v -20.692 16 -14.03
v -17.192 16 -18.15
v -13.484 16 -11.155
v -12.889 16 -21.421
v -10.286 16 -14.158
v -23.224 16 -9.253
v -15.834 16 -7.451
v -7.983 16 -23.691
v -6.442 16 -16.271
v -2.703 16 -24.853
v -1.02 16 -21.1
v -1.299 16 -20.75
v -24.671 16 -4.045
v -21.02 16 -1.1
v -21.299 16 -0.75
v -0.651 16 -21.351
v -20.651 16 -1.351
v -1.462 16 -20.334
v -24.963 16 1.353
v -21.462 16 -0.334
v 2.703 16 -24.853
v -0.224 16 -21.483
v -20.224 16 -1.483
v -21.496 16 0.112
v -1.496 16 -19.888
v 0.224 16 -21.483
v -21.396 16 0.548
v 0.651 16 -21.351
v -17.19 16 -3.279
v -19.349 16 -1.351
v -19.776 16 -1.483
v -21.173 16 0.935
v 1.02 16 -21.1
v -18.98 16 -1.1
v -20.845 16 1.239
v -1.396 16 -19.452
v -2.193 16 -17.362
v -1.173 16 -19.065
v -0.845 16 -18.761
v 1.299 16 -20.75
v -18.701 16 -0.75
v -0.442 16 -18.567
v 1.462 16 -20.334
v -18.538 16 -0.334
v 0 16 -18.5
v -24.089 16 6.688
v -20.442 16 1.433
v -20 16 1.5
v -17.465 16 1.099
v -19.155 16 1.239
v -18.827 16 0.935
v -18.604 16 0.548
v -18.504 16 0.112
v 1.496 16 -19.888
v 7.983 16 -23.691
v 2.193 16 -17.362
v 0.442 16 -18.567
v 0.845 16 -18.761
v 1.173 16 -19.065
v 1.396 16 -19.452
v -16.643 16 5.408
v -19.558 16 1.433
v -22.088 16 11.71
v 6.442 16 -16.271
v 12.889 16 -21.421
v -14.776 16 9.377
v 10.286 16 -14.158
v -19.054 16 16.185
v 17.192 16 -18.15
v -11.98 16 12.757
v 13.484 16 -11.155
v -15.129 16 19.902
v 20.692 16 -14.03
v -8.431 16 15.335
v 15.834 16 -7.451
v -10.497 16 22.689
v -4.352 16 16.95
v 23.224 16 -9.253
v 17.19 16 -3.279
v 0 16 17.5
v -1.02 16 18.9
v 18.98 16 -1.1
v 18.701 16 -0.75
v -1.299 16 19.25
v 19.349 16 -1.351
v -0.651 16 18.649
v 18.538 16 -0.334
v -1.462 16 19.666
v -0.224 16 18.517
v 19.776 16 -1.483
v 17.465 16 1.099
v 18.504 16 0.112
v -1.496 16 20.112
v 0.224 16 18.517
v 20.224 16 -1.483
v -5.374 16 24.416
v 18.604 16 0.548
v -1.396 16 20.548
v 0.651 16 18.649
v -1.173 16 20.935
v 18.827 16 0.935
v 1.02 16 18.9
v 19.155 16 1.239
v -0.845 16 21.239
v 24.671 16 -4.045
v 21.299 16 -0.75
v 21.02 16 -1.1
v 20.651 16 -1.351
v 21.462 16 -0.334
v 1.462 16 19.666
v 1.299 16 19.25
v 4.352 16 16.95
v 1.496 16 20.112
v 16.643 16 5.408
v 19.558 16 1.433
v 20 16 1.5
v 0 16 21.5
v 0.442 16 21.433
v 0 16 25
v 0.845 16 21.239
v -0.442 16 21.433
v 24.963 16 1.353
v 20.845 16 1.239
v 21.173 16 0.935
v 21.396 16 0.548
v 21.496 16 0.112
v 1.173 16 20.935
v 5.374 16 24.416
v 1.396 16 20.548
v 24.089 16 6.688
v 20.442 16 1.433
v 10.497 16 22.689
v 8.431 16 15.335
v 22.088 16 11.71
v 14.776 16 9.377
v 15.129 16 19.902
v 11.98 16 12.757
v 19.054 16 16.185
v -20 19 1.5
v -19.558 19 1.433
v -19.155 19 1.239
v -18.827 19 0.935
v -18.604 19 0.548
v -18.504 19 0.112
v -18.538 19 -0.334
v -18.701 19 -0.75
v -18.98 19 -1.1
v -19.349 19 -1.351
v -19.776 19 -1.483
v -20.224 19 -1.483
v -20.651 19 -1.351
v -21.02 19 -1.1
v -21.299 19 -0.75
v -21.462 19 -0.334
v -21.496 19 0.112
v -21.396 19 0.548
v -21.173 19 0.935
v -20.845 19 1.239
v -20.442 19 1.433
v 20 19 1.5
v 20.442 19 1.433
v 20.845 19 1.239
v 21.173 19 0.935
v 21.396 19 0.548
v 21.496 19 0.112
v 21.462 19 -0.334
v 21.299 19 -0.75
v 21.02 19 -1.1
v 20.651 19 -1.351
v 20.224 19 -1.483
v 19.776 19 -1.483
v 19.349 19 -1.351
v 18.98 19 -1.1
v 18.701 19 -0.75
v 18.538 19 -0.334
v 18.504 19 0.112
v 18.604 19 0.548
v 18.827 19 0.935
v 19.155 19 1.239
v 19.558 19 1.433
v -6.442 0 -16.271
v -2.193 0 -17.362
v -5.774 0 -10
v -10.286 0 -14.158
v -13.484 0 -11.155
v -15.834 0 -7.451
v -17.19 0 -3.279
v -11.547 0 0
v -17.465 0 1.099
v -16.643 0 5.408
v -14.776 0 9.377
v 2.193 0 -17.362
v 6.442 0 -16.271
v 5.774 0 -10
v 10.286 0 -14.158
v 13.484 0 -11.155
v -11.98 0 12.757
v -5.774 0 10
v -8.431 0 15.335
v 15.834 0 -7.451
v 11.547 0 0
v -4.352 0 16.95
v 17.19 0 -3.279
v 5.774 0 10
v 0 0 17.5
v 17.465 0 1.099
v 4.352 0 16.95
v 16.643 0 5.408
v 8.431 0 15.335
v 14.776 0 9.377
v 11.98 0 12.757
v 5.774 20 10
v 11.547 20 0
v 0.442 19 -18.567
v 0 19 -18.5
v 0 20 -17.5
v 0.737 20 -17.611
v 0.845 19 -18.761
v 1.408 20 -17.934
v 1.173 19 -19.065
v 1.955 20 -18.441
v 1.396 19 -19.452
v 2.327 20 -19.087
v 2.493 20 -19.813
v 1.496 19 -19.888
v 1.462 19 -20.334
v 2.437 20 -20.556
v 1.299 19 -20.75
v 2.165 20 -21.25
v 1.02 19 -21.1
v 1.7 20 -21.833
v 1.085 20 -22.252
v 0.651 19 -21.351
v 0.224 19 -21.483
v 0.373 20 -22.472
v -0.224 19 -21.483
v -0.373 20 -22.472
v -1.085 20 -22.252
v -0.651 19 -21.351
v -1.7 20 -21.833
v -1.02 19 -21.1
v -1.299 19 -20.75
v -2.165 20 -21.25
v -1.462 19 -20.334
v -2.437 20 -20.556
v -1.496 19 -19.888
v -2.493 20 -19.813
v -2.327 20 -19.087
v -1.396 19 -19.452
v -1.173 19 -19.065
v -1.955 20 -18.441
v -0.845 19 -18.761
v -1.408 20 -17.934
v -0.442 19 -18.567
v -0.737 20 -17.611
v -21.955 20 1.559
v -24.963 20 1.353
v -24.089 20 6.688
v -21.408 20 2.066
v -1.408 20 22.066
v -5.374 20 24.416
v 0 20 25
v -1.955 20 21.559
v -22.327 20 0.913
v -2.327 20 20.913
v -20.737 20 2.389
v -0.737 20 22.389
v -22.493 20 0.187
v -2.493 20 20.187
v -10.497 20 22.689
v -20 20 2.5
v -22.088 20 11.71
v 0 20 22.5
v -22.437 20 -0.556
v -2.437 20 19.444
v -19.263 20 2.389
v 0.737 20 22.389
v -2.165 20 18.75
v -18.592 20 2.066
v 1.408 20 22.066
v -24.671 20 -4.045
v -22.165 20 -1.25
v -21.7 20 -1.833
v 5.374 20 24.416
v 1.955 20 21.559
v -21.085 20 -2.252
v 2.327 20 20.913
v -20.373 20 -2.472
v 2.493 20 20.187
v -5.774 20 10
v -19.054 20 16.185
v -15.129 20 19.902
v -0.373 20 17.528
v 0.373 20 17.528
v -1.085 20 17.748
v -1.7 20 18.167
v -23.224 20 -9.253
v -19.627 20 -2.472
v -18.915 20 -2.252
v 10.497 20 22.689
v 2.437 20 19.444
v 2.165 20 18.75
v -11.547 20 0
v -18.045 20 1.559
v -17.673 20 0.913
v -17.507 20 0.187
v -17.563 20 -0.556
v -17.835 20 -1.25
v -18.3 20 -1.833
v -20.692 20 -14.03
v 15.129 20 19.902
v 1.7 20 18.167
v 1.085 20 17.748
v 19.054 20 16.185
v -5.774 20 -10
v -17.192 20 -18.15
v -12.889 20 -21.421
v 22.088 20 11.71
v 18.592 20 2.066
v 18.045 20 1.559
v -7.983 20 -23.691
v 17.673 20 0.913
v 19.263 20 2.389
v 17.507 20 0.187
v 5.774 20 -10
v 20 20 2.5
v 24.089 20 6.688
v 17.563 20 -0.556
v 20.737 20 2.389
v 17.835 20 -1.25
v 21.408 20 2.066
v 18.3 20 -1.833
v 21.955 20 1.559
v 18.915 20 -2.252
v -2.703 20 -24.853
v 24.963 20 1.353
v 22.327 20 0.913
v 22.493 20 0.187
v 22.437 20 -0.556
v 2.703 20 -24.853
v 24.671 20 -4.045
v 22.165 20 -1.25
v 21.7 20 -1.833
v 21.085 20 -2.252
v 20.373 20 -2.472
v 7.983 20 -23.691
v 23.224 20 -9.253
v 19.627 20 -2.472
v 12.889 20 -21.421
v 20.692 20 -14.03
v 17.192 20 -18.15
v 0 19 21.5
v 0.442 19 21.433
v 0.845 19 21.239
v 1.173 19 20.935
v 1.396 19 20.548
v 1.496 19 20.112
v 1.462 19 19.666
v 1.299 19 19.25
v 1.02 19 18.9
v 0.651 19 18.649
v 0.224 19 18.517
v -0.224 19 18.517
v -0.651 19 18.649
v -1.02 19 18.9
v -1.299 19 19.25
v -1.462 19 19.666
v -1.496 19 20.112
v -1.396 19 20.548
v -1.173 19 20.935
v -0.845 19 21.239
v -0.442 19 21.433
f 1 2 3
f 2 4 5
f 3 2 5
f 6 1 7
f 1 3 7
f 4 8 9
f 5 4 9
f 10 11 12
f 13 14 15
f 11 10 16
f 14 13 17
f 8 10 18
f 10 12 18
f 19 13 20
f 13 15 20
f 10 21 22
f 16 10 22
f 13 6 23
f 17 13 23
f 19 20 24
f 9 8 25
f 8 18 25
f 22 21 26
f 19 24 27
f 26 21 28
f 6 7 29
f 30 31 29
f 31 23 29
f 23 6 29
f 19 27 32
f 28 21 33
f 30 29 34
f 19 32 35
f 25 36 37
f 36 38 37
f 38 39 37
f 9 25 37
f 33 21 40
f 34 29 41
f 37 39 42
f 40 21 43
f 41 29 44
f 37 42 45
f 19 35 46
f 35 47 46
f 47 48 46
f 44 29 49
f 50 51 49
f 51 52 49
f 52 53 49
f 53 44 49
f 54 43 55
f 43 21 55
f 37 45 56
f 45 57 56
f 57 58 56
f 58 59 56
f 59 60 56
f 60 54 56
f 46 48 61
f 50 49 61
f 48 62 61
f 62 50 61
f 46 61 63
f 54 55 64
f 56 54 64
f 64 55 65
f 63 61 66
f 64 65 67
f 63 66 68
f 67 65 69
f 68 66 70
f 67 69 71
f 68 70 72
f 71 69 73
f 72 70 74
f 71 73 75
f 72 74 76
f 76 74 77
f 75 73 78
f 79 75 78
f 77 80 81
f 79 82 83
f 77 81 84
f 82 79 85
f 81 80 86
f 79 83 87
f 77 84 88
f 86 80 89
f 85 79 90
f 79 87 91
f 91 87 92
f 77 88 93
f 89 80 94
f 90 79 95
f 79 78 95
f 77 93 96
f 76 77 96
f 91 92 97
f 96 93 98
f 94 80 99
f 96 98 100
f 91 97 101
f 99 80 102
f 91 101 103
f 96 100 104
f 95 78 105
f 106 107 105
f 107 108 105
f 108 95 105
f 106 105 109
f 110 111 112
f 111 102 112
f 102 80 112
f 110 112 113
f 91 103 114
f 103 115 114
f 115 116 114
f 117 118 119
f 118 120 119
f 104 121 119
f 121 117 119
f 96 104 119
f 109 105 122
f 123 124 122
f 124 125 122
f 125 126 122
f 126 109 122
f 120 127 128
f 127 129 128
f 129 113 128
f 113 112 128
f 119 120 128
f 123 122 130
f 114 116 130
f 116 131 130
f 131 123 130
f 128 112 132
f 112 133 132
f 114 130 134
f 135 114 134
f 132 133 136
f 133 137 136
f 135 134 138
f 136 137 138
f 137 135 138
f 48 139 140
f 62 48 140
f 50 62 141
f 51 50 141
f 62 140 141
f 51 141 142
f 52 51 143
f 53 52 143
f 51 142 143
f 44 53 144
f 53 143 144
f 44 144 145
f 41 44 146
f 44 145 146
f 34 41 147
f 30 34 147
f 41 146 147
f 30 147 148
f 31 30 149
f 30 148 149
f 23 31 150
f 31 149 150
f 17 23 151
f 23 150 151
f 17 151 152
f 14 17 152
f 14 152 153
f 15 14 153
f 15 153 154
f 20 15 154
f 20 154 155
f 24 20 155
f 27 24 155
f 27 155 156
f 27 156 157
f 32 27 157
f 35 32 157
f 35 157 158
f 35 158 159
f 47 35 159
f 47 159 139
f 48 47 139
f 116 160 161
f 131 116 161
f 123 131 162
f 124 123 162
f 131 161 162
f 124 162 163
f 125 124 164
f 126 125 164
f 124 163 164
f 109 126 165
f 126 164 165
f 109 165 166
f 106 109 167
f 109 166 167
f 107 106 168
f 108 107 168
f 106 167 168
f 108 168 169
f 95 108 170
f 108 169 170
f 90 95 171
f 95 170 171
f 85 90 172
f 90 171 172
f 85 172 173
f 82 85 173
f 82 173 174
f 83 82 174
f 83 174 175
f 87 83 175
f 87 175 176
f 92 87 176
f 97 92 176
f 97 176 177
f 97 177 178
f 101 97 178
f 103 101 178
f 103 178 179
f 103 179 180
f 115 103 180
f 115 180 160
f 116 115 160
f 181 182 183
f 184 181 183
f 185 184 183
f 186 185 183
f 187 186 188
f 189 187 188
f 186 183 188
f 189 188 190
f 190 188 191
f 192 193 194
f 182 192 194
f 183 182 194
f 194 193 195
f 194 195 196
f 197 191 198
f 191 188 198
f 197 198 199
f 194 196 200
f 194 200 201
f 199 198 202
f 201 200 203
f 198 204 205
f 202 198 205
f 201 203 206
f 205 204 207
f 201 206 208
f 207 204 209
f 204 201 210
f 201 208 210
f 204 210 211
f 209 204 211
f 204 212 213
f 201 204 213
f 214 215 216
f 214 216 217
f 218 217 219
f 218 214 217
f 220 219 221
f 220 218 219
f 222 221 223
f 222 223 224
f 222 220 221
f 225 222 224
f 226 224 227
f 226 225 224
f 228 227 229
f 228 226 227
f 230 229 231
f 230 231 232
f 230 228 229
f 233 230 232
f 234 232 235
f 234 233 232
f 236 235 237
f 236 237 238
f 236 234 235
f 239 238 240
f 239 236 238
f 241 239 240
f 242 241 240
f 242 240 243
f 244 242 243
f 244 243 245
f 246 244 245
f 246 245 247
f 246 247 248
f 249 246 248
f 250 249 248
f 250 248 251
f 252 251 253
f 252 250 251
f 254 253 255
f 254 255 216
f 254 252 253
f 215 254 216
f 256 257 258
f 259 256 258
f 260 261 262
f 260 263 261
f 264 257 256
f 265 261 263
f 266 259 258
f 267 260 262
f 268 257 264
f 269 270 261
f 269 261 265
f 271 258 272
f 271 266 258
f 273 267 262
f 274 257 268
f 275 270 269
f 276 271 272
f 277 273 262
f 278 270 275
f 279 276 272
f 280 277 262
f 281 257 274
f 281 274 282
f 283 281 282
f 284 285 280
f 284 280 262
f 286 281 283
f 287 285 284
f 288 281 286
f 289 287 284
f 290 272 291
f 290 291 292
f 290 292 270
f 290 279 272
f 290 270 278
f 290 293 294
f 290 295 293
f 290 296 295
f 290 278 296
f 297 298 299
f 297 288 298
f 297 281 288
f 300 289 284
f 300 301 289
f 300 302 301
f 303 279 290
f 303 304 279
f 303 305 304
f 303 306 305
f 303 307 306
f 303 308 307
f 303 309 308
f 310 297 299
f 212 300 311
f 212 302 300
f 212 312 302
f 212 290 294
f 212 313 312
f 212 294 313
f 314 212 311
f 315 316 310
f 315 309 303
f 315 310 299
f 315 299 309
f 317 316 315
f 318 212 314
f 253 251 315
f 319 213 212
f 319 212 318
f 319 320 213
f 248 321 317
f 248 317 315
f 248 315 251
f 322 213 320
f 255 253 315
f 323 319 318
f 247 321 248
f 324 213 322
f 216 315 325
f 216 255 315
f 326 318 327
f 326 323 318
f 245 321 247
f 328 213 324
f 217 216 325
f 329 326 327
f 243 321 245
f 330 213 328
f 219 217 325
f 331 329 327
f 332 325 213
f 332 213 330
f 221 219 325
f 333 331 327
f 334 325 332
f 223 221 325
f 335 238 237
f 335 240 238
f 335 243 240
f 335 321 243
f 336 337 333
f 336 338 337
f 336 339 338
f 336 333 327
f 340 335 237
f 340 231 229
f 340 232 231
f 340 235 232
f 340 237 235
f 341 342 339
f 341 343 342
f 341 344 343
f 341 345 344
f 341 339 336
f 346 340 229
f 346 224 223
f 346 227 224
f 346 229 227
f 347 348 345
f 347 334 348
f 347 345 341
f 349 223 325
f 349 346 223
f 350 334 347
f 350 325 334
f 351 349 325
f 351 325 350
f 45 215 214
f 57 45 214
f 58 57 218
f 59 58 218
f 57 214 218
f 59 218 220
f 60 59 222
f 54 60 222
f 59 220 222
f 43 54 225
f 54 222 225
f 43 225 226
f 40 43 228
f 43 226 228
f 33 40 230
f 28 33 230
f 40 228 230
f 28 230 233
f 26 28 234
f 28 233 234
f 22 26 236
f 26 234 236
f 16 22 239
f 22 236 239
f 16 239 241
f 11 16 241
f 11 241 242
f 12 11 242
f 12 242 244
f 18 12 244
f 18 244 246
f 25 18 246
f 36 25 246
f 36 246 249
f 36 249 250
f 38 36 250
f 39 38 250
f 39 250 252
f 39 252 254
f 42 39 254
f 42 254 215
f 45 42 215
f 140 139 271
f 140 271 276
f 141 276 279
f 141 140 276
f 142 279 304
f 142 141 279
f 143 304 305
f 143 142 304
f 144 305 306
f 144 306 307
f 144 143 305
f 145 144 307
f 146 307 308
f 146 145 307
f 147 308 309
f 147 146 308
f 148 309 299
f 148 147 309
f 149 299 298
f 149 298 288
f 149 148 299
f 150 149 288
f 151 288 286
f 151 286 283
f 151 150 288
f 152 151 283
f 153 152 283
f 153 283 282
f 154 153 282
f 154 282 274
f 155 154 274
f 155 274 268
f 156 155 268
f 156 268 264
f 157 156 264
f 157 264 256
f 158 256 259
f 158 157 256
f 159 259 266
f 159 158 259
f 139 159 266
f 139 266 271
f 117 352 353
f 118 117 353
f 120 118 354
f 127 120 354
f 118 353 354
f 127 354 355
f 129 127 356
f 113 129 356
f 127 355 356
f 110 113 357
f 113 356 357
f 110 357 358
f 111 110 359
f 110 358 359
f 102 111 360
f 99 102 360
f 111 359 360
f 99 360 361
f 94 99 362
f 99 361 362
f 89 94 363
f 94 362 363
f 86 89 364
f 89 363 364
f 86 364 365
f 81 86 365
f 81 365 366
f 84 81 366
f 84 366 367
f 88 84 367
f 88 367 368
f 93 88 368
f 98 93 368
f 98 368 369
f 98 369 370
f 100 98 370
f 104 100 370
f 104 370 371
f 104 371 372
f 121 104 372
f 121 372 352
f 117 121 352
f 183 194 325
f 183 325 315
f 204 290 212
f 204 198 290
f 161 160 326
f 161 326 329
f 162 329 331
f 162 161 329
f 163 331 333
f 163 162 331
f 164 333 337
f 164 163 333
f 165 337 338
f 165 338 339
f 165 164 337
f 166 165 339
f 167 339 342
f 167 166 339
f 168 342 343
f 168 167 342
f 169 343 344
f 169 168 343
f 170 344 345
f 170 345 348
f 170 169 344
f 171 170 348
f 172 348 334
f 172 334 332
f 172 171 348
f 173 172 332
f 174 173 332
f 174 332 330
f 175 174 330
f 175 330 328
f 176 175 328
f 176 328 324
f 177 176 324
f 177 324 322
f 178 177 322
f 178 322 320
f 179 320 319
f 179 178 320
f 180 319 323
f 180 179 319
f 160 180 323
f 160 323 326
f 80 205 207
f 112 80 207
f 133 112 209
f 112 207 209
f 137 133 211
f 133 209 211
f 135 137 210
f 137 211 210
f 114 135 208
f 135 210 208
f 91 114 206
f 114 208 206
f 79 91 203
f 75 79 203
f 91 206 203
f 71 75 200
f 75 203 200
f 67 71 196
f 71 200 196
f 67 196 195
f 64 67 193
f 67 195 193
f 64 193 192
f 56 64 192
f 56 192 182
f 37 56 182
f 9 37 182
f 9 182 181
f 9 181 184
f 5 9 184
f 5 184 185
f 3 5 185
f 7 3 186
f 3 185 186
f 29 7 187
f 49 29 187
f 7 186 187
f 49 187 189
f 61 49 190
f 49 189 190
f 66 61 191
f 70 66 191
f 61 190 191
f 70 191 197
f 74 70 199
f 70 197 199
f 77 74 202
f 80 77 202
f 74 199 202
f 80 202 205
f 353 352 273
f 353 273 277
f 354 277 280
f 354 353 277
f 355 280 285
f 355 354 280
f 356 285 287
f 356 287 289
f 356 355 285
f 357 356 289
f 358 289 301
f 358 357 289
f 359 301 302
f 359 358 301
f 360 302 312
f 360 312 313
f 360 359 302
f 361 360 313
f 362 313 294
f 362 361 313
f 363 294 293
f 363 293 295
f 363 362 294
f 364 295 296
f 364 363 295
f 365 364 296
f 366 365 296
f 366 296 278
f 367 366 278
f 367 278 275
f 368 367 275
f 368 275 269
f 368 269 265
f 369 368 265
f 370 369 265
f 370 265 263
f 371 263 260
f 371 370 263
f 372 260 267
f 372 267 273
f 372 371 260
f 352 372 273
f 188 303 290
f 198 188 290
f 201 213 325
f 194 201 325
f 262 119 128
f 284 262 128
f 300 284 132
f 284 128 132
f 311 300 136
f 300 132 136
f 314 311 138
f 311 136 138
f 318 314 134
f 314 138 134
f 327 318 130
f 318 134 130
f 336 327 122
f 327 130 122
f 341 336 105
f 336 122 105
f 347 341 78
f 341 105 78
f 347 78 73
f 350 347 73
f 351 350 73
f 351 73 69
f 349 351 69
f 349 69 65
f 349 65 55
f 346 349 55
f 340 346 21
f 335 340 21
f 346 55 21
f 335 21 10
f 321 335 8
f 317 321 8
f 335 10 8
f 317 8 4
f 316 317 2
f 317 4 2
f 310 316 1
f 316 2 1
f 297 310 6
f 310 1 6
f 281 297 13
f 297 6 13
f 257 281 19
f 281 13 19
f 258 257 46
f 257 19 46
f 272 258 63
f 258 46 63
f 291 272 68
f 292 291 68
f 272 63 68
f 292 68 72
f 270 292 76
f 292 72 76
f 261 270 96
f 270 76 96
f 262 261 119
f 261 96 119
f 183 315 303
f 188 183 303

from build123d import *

# Parameters (mm, degrees)
SKETCH1_R           = 17.5
BOSS_EXTRUDE1_DEPTH = 16
SKETCH2_R           = 25
SKETCH2_R_2         = 12.5
BOSS_EXTRUDE2_DEPTH = 4
SKETCH3_R           = 1.5
CUT_EXTRUDE1_DEPTH  = 41.620192023
CHAMFER1_SIZE       = 1
SKETCH4_R           = 12.5
BOSS_EXTRUDE3_DEPTH = 4


with BuildPart() as part:
    # Sketch1 → Boss-Extrude1 (new body)
    with BuildSketch(Plane(origin=(0, 0, 0), x_dir=(1, 0, 0), z_dir=(0, 1, 0))):
        with Locations(Location((0, 0, 0), (0, 0, 270))):
            Circle(SKETCH1_R)
        Polygon((5.773502692, -10), (11.547005384, 0), (5.773502692, 10), (-5.773502692, 10), (-11.547005384, 0), (-5.773502692, -10), align=None, mode=Mode.SUBTRACT)
    extrude(amount=BOSS_EXTRUDE1_DEPTH)

    # Sketch2 → Boss-Extrude2 (add)
    with BuildSketch(Plane(origin=(0, 16, 0), x_dir=(1, 0, 0), z_dir=(0, 1, 0))):
        with Locations(Location((0, 0, 0), (0, 0, 270))):
            Circle(SKETCH2_R)
        with Locations(Location((0, 0, 0), (0, 0, 270))):
            Circle(SKETCH2_R_2, mode=Mode.SUBTRACT)
    extrude(amount=BOSS_EXTRUDE2_DEPTH)

    # Sketch3 → Cut-Extrude1 (cut, through all)
    with BuildSketch(Plane(origin=(0, 20, 0), x_dir=(1, 0, 0), z_dir=(0, 1, 0))):
        with Locations(Location((0, 20, 0), (0, 0, 270))):
            Circle(SKETCH3_R)
        with Locations(Location((20, 0, 0), (0, 0, 270))):
            Circle(SKETCH3_R)
        with Locations(Location((0, -20, 0), (0, 0, 270))):
            Circle(SKETCH3_R)
        with Locations(Location((-20, 0, 0), (0, 0, 270))):
            Circle(SKETCH3_R)
    extrude(amount=-CUT_EXTRUDE1_DEPTH, mode=Mode.SUBTRACT)

    # Chamfer1
    chamfer1_edges = [part.edges().sort_by_distance(p)[0] for p in [
        (0, 20, -21.5),
        (20, 20, -1.5),
        (0, 20, 18.5),
        (-20, 20, -1.5),
    ]]
    chamfer(chamfer1_edges, length=CHAMFER1_SIZE)

    # Sketch4 → Boss-Extrude3 (add)
    with BuildSketch(Plane(origin=(0, 16, 0), x_dir=(1, 0, 0), z_dir=(0, 1, 0))):
        Circle(SKETCH4_R)
        Polygon((-5.773502692, -10), (5.773502692, -10), (11.547005384, 0), (5.773502692, 10), (-5.773502692, 10), (-11.547005384, 0), align=None, mode=Mode.SUBTRACT)
    extrude(amount=BOSS_EXTRUDE3_DEPTH)


solid = part.part
